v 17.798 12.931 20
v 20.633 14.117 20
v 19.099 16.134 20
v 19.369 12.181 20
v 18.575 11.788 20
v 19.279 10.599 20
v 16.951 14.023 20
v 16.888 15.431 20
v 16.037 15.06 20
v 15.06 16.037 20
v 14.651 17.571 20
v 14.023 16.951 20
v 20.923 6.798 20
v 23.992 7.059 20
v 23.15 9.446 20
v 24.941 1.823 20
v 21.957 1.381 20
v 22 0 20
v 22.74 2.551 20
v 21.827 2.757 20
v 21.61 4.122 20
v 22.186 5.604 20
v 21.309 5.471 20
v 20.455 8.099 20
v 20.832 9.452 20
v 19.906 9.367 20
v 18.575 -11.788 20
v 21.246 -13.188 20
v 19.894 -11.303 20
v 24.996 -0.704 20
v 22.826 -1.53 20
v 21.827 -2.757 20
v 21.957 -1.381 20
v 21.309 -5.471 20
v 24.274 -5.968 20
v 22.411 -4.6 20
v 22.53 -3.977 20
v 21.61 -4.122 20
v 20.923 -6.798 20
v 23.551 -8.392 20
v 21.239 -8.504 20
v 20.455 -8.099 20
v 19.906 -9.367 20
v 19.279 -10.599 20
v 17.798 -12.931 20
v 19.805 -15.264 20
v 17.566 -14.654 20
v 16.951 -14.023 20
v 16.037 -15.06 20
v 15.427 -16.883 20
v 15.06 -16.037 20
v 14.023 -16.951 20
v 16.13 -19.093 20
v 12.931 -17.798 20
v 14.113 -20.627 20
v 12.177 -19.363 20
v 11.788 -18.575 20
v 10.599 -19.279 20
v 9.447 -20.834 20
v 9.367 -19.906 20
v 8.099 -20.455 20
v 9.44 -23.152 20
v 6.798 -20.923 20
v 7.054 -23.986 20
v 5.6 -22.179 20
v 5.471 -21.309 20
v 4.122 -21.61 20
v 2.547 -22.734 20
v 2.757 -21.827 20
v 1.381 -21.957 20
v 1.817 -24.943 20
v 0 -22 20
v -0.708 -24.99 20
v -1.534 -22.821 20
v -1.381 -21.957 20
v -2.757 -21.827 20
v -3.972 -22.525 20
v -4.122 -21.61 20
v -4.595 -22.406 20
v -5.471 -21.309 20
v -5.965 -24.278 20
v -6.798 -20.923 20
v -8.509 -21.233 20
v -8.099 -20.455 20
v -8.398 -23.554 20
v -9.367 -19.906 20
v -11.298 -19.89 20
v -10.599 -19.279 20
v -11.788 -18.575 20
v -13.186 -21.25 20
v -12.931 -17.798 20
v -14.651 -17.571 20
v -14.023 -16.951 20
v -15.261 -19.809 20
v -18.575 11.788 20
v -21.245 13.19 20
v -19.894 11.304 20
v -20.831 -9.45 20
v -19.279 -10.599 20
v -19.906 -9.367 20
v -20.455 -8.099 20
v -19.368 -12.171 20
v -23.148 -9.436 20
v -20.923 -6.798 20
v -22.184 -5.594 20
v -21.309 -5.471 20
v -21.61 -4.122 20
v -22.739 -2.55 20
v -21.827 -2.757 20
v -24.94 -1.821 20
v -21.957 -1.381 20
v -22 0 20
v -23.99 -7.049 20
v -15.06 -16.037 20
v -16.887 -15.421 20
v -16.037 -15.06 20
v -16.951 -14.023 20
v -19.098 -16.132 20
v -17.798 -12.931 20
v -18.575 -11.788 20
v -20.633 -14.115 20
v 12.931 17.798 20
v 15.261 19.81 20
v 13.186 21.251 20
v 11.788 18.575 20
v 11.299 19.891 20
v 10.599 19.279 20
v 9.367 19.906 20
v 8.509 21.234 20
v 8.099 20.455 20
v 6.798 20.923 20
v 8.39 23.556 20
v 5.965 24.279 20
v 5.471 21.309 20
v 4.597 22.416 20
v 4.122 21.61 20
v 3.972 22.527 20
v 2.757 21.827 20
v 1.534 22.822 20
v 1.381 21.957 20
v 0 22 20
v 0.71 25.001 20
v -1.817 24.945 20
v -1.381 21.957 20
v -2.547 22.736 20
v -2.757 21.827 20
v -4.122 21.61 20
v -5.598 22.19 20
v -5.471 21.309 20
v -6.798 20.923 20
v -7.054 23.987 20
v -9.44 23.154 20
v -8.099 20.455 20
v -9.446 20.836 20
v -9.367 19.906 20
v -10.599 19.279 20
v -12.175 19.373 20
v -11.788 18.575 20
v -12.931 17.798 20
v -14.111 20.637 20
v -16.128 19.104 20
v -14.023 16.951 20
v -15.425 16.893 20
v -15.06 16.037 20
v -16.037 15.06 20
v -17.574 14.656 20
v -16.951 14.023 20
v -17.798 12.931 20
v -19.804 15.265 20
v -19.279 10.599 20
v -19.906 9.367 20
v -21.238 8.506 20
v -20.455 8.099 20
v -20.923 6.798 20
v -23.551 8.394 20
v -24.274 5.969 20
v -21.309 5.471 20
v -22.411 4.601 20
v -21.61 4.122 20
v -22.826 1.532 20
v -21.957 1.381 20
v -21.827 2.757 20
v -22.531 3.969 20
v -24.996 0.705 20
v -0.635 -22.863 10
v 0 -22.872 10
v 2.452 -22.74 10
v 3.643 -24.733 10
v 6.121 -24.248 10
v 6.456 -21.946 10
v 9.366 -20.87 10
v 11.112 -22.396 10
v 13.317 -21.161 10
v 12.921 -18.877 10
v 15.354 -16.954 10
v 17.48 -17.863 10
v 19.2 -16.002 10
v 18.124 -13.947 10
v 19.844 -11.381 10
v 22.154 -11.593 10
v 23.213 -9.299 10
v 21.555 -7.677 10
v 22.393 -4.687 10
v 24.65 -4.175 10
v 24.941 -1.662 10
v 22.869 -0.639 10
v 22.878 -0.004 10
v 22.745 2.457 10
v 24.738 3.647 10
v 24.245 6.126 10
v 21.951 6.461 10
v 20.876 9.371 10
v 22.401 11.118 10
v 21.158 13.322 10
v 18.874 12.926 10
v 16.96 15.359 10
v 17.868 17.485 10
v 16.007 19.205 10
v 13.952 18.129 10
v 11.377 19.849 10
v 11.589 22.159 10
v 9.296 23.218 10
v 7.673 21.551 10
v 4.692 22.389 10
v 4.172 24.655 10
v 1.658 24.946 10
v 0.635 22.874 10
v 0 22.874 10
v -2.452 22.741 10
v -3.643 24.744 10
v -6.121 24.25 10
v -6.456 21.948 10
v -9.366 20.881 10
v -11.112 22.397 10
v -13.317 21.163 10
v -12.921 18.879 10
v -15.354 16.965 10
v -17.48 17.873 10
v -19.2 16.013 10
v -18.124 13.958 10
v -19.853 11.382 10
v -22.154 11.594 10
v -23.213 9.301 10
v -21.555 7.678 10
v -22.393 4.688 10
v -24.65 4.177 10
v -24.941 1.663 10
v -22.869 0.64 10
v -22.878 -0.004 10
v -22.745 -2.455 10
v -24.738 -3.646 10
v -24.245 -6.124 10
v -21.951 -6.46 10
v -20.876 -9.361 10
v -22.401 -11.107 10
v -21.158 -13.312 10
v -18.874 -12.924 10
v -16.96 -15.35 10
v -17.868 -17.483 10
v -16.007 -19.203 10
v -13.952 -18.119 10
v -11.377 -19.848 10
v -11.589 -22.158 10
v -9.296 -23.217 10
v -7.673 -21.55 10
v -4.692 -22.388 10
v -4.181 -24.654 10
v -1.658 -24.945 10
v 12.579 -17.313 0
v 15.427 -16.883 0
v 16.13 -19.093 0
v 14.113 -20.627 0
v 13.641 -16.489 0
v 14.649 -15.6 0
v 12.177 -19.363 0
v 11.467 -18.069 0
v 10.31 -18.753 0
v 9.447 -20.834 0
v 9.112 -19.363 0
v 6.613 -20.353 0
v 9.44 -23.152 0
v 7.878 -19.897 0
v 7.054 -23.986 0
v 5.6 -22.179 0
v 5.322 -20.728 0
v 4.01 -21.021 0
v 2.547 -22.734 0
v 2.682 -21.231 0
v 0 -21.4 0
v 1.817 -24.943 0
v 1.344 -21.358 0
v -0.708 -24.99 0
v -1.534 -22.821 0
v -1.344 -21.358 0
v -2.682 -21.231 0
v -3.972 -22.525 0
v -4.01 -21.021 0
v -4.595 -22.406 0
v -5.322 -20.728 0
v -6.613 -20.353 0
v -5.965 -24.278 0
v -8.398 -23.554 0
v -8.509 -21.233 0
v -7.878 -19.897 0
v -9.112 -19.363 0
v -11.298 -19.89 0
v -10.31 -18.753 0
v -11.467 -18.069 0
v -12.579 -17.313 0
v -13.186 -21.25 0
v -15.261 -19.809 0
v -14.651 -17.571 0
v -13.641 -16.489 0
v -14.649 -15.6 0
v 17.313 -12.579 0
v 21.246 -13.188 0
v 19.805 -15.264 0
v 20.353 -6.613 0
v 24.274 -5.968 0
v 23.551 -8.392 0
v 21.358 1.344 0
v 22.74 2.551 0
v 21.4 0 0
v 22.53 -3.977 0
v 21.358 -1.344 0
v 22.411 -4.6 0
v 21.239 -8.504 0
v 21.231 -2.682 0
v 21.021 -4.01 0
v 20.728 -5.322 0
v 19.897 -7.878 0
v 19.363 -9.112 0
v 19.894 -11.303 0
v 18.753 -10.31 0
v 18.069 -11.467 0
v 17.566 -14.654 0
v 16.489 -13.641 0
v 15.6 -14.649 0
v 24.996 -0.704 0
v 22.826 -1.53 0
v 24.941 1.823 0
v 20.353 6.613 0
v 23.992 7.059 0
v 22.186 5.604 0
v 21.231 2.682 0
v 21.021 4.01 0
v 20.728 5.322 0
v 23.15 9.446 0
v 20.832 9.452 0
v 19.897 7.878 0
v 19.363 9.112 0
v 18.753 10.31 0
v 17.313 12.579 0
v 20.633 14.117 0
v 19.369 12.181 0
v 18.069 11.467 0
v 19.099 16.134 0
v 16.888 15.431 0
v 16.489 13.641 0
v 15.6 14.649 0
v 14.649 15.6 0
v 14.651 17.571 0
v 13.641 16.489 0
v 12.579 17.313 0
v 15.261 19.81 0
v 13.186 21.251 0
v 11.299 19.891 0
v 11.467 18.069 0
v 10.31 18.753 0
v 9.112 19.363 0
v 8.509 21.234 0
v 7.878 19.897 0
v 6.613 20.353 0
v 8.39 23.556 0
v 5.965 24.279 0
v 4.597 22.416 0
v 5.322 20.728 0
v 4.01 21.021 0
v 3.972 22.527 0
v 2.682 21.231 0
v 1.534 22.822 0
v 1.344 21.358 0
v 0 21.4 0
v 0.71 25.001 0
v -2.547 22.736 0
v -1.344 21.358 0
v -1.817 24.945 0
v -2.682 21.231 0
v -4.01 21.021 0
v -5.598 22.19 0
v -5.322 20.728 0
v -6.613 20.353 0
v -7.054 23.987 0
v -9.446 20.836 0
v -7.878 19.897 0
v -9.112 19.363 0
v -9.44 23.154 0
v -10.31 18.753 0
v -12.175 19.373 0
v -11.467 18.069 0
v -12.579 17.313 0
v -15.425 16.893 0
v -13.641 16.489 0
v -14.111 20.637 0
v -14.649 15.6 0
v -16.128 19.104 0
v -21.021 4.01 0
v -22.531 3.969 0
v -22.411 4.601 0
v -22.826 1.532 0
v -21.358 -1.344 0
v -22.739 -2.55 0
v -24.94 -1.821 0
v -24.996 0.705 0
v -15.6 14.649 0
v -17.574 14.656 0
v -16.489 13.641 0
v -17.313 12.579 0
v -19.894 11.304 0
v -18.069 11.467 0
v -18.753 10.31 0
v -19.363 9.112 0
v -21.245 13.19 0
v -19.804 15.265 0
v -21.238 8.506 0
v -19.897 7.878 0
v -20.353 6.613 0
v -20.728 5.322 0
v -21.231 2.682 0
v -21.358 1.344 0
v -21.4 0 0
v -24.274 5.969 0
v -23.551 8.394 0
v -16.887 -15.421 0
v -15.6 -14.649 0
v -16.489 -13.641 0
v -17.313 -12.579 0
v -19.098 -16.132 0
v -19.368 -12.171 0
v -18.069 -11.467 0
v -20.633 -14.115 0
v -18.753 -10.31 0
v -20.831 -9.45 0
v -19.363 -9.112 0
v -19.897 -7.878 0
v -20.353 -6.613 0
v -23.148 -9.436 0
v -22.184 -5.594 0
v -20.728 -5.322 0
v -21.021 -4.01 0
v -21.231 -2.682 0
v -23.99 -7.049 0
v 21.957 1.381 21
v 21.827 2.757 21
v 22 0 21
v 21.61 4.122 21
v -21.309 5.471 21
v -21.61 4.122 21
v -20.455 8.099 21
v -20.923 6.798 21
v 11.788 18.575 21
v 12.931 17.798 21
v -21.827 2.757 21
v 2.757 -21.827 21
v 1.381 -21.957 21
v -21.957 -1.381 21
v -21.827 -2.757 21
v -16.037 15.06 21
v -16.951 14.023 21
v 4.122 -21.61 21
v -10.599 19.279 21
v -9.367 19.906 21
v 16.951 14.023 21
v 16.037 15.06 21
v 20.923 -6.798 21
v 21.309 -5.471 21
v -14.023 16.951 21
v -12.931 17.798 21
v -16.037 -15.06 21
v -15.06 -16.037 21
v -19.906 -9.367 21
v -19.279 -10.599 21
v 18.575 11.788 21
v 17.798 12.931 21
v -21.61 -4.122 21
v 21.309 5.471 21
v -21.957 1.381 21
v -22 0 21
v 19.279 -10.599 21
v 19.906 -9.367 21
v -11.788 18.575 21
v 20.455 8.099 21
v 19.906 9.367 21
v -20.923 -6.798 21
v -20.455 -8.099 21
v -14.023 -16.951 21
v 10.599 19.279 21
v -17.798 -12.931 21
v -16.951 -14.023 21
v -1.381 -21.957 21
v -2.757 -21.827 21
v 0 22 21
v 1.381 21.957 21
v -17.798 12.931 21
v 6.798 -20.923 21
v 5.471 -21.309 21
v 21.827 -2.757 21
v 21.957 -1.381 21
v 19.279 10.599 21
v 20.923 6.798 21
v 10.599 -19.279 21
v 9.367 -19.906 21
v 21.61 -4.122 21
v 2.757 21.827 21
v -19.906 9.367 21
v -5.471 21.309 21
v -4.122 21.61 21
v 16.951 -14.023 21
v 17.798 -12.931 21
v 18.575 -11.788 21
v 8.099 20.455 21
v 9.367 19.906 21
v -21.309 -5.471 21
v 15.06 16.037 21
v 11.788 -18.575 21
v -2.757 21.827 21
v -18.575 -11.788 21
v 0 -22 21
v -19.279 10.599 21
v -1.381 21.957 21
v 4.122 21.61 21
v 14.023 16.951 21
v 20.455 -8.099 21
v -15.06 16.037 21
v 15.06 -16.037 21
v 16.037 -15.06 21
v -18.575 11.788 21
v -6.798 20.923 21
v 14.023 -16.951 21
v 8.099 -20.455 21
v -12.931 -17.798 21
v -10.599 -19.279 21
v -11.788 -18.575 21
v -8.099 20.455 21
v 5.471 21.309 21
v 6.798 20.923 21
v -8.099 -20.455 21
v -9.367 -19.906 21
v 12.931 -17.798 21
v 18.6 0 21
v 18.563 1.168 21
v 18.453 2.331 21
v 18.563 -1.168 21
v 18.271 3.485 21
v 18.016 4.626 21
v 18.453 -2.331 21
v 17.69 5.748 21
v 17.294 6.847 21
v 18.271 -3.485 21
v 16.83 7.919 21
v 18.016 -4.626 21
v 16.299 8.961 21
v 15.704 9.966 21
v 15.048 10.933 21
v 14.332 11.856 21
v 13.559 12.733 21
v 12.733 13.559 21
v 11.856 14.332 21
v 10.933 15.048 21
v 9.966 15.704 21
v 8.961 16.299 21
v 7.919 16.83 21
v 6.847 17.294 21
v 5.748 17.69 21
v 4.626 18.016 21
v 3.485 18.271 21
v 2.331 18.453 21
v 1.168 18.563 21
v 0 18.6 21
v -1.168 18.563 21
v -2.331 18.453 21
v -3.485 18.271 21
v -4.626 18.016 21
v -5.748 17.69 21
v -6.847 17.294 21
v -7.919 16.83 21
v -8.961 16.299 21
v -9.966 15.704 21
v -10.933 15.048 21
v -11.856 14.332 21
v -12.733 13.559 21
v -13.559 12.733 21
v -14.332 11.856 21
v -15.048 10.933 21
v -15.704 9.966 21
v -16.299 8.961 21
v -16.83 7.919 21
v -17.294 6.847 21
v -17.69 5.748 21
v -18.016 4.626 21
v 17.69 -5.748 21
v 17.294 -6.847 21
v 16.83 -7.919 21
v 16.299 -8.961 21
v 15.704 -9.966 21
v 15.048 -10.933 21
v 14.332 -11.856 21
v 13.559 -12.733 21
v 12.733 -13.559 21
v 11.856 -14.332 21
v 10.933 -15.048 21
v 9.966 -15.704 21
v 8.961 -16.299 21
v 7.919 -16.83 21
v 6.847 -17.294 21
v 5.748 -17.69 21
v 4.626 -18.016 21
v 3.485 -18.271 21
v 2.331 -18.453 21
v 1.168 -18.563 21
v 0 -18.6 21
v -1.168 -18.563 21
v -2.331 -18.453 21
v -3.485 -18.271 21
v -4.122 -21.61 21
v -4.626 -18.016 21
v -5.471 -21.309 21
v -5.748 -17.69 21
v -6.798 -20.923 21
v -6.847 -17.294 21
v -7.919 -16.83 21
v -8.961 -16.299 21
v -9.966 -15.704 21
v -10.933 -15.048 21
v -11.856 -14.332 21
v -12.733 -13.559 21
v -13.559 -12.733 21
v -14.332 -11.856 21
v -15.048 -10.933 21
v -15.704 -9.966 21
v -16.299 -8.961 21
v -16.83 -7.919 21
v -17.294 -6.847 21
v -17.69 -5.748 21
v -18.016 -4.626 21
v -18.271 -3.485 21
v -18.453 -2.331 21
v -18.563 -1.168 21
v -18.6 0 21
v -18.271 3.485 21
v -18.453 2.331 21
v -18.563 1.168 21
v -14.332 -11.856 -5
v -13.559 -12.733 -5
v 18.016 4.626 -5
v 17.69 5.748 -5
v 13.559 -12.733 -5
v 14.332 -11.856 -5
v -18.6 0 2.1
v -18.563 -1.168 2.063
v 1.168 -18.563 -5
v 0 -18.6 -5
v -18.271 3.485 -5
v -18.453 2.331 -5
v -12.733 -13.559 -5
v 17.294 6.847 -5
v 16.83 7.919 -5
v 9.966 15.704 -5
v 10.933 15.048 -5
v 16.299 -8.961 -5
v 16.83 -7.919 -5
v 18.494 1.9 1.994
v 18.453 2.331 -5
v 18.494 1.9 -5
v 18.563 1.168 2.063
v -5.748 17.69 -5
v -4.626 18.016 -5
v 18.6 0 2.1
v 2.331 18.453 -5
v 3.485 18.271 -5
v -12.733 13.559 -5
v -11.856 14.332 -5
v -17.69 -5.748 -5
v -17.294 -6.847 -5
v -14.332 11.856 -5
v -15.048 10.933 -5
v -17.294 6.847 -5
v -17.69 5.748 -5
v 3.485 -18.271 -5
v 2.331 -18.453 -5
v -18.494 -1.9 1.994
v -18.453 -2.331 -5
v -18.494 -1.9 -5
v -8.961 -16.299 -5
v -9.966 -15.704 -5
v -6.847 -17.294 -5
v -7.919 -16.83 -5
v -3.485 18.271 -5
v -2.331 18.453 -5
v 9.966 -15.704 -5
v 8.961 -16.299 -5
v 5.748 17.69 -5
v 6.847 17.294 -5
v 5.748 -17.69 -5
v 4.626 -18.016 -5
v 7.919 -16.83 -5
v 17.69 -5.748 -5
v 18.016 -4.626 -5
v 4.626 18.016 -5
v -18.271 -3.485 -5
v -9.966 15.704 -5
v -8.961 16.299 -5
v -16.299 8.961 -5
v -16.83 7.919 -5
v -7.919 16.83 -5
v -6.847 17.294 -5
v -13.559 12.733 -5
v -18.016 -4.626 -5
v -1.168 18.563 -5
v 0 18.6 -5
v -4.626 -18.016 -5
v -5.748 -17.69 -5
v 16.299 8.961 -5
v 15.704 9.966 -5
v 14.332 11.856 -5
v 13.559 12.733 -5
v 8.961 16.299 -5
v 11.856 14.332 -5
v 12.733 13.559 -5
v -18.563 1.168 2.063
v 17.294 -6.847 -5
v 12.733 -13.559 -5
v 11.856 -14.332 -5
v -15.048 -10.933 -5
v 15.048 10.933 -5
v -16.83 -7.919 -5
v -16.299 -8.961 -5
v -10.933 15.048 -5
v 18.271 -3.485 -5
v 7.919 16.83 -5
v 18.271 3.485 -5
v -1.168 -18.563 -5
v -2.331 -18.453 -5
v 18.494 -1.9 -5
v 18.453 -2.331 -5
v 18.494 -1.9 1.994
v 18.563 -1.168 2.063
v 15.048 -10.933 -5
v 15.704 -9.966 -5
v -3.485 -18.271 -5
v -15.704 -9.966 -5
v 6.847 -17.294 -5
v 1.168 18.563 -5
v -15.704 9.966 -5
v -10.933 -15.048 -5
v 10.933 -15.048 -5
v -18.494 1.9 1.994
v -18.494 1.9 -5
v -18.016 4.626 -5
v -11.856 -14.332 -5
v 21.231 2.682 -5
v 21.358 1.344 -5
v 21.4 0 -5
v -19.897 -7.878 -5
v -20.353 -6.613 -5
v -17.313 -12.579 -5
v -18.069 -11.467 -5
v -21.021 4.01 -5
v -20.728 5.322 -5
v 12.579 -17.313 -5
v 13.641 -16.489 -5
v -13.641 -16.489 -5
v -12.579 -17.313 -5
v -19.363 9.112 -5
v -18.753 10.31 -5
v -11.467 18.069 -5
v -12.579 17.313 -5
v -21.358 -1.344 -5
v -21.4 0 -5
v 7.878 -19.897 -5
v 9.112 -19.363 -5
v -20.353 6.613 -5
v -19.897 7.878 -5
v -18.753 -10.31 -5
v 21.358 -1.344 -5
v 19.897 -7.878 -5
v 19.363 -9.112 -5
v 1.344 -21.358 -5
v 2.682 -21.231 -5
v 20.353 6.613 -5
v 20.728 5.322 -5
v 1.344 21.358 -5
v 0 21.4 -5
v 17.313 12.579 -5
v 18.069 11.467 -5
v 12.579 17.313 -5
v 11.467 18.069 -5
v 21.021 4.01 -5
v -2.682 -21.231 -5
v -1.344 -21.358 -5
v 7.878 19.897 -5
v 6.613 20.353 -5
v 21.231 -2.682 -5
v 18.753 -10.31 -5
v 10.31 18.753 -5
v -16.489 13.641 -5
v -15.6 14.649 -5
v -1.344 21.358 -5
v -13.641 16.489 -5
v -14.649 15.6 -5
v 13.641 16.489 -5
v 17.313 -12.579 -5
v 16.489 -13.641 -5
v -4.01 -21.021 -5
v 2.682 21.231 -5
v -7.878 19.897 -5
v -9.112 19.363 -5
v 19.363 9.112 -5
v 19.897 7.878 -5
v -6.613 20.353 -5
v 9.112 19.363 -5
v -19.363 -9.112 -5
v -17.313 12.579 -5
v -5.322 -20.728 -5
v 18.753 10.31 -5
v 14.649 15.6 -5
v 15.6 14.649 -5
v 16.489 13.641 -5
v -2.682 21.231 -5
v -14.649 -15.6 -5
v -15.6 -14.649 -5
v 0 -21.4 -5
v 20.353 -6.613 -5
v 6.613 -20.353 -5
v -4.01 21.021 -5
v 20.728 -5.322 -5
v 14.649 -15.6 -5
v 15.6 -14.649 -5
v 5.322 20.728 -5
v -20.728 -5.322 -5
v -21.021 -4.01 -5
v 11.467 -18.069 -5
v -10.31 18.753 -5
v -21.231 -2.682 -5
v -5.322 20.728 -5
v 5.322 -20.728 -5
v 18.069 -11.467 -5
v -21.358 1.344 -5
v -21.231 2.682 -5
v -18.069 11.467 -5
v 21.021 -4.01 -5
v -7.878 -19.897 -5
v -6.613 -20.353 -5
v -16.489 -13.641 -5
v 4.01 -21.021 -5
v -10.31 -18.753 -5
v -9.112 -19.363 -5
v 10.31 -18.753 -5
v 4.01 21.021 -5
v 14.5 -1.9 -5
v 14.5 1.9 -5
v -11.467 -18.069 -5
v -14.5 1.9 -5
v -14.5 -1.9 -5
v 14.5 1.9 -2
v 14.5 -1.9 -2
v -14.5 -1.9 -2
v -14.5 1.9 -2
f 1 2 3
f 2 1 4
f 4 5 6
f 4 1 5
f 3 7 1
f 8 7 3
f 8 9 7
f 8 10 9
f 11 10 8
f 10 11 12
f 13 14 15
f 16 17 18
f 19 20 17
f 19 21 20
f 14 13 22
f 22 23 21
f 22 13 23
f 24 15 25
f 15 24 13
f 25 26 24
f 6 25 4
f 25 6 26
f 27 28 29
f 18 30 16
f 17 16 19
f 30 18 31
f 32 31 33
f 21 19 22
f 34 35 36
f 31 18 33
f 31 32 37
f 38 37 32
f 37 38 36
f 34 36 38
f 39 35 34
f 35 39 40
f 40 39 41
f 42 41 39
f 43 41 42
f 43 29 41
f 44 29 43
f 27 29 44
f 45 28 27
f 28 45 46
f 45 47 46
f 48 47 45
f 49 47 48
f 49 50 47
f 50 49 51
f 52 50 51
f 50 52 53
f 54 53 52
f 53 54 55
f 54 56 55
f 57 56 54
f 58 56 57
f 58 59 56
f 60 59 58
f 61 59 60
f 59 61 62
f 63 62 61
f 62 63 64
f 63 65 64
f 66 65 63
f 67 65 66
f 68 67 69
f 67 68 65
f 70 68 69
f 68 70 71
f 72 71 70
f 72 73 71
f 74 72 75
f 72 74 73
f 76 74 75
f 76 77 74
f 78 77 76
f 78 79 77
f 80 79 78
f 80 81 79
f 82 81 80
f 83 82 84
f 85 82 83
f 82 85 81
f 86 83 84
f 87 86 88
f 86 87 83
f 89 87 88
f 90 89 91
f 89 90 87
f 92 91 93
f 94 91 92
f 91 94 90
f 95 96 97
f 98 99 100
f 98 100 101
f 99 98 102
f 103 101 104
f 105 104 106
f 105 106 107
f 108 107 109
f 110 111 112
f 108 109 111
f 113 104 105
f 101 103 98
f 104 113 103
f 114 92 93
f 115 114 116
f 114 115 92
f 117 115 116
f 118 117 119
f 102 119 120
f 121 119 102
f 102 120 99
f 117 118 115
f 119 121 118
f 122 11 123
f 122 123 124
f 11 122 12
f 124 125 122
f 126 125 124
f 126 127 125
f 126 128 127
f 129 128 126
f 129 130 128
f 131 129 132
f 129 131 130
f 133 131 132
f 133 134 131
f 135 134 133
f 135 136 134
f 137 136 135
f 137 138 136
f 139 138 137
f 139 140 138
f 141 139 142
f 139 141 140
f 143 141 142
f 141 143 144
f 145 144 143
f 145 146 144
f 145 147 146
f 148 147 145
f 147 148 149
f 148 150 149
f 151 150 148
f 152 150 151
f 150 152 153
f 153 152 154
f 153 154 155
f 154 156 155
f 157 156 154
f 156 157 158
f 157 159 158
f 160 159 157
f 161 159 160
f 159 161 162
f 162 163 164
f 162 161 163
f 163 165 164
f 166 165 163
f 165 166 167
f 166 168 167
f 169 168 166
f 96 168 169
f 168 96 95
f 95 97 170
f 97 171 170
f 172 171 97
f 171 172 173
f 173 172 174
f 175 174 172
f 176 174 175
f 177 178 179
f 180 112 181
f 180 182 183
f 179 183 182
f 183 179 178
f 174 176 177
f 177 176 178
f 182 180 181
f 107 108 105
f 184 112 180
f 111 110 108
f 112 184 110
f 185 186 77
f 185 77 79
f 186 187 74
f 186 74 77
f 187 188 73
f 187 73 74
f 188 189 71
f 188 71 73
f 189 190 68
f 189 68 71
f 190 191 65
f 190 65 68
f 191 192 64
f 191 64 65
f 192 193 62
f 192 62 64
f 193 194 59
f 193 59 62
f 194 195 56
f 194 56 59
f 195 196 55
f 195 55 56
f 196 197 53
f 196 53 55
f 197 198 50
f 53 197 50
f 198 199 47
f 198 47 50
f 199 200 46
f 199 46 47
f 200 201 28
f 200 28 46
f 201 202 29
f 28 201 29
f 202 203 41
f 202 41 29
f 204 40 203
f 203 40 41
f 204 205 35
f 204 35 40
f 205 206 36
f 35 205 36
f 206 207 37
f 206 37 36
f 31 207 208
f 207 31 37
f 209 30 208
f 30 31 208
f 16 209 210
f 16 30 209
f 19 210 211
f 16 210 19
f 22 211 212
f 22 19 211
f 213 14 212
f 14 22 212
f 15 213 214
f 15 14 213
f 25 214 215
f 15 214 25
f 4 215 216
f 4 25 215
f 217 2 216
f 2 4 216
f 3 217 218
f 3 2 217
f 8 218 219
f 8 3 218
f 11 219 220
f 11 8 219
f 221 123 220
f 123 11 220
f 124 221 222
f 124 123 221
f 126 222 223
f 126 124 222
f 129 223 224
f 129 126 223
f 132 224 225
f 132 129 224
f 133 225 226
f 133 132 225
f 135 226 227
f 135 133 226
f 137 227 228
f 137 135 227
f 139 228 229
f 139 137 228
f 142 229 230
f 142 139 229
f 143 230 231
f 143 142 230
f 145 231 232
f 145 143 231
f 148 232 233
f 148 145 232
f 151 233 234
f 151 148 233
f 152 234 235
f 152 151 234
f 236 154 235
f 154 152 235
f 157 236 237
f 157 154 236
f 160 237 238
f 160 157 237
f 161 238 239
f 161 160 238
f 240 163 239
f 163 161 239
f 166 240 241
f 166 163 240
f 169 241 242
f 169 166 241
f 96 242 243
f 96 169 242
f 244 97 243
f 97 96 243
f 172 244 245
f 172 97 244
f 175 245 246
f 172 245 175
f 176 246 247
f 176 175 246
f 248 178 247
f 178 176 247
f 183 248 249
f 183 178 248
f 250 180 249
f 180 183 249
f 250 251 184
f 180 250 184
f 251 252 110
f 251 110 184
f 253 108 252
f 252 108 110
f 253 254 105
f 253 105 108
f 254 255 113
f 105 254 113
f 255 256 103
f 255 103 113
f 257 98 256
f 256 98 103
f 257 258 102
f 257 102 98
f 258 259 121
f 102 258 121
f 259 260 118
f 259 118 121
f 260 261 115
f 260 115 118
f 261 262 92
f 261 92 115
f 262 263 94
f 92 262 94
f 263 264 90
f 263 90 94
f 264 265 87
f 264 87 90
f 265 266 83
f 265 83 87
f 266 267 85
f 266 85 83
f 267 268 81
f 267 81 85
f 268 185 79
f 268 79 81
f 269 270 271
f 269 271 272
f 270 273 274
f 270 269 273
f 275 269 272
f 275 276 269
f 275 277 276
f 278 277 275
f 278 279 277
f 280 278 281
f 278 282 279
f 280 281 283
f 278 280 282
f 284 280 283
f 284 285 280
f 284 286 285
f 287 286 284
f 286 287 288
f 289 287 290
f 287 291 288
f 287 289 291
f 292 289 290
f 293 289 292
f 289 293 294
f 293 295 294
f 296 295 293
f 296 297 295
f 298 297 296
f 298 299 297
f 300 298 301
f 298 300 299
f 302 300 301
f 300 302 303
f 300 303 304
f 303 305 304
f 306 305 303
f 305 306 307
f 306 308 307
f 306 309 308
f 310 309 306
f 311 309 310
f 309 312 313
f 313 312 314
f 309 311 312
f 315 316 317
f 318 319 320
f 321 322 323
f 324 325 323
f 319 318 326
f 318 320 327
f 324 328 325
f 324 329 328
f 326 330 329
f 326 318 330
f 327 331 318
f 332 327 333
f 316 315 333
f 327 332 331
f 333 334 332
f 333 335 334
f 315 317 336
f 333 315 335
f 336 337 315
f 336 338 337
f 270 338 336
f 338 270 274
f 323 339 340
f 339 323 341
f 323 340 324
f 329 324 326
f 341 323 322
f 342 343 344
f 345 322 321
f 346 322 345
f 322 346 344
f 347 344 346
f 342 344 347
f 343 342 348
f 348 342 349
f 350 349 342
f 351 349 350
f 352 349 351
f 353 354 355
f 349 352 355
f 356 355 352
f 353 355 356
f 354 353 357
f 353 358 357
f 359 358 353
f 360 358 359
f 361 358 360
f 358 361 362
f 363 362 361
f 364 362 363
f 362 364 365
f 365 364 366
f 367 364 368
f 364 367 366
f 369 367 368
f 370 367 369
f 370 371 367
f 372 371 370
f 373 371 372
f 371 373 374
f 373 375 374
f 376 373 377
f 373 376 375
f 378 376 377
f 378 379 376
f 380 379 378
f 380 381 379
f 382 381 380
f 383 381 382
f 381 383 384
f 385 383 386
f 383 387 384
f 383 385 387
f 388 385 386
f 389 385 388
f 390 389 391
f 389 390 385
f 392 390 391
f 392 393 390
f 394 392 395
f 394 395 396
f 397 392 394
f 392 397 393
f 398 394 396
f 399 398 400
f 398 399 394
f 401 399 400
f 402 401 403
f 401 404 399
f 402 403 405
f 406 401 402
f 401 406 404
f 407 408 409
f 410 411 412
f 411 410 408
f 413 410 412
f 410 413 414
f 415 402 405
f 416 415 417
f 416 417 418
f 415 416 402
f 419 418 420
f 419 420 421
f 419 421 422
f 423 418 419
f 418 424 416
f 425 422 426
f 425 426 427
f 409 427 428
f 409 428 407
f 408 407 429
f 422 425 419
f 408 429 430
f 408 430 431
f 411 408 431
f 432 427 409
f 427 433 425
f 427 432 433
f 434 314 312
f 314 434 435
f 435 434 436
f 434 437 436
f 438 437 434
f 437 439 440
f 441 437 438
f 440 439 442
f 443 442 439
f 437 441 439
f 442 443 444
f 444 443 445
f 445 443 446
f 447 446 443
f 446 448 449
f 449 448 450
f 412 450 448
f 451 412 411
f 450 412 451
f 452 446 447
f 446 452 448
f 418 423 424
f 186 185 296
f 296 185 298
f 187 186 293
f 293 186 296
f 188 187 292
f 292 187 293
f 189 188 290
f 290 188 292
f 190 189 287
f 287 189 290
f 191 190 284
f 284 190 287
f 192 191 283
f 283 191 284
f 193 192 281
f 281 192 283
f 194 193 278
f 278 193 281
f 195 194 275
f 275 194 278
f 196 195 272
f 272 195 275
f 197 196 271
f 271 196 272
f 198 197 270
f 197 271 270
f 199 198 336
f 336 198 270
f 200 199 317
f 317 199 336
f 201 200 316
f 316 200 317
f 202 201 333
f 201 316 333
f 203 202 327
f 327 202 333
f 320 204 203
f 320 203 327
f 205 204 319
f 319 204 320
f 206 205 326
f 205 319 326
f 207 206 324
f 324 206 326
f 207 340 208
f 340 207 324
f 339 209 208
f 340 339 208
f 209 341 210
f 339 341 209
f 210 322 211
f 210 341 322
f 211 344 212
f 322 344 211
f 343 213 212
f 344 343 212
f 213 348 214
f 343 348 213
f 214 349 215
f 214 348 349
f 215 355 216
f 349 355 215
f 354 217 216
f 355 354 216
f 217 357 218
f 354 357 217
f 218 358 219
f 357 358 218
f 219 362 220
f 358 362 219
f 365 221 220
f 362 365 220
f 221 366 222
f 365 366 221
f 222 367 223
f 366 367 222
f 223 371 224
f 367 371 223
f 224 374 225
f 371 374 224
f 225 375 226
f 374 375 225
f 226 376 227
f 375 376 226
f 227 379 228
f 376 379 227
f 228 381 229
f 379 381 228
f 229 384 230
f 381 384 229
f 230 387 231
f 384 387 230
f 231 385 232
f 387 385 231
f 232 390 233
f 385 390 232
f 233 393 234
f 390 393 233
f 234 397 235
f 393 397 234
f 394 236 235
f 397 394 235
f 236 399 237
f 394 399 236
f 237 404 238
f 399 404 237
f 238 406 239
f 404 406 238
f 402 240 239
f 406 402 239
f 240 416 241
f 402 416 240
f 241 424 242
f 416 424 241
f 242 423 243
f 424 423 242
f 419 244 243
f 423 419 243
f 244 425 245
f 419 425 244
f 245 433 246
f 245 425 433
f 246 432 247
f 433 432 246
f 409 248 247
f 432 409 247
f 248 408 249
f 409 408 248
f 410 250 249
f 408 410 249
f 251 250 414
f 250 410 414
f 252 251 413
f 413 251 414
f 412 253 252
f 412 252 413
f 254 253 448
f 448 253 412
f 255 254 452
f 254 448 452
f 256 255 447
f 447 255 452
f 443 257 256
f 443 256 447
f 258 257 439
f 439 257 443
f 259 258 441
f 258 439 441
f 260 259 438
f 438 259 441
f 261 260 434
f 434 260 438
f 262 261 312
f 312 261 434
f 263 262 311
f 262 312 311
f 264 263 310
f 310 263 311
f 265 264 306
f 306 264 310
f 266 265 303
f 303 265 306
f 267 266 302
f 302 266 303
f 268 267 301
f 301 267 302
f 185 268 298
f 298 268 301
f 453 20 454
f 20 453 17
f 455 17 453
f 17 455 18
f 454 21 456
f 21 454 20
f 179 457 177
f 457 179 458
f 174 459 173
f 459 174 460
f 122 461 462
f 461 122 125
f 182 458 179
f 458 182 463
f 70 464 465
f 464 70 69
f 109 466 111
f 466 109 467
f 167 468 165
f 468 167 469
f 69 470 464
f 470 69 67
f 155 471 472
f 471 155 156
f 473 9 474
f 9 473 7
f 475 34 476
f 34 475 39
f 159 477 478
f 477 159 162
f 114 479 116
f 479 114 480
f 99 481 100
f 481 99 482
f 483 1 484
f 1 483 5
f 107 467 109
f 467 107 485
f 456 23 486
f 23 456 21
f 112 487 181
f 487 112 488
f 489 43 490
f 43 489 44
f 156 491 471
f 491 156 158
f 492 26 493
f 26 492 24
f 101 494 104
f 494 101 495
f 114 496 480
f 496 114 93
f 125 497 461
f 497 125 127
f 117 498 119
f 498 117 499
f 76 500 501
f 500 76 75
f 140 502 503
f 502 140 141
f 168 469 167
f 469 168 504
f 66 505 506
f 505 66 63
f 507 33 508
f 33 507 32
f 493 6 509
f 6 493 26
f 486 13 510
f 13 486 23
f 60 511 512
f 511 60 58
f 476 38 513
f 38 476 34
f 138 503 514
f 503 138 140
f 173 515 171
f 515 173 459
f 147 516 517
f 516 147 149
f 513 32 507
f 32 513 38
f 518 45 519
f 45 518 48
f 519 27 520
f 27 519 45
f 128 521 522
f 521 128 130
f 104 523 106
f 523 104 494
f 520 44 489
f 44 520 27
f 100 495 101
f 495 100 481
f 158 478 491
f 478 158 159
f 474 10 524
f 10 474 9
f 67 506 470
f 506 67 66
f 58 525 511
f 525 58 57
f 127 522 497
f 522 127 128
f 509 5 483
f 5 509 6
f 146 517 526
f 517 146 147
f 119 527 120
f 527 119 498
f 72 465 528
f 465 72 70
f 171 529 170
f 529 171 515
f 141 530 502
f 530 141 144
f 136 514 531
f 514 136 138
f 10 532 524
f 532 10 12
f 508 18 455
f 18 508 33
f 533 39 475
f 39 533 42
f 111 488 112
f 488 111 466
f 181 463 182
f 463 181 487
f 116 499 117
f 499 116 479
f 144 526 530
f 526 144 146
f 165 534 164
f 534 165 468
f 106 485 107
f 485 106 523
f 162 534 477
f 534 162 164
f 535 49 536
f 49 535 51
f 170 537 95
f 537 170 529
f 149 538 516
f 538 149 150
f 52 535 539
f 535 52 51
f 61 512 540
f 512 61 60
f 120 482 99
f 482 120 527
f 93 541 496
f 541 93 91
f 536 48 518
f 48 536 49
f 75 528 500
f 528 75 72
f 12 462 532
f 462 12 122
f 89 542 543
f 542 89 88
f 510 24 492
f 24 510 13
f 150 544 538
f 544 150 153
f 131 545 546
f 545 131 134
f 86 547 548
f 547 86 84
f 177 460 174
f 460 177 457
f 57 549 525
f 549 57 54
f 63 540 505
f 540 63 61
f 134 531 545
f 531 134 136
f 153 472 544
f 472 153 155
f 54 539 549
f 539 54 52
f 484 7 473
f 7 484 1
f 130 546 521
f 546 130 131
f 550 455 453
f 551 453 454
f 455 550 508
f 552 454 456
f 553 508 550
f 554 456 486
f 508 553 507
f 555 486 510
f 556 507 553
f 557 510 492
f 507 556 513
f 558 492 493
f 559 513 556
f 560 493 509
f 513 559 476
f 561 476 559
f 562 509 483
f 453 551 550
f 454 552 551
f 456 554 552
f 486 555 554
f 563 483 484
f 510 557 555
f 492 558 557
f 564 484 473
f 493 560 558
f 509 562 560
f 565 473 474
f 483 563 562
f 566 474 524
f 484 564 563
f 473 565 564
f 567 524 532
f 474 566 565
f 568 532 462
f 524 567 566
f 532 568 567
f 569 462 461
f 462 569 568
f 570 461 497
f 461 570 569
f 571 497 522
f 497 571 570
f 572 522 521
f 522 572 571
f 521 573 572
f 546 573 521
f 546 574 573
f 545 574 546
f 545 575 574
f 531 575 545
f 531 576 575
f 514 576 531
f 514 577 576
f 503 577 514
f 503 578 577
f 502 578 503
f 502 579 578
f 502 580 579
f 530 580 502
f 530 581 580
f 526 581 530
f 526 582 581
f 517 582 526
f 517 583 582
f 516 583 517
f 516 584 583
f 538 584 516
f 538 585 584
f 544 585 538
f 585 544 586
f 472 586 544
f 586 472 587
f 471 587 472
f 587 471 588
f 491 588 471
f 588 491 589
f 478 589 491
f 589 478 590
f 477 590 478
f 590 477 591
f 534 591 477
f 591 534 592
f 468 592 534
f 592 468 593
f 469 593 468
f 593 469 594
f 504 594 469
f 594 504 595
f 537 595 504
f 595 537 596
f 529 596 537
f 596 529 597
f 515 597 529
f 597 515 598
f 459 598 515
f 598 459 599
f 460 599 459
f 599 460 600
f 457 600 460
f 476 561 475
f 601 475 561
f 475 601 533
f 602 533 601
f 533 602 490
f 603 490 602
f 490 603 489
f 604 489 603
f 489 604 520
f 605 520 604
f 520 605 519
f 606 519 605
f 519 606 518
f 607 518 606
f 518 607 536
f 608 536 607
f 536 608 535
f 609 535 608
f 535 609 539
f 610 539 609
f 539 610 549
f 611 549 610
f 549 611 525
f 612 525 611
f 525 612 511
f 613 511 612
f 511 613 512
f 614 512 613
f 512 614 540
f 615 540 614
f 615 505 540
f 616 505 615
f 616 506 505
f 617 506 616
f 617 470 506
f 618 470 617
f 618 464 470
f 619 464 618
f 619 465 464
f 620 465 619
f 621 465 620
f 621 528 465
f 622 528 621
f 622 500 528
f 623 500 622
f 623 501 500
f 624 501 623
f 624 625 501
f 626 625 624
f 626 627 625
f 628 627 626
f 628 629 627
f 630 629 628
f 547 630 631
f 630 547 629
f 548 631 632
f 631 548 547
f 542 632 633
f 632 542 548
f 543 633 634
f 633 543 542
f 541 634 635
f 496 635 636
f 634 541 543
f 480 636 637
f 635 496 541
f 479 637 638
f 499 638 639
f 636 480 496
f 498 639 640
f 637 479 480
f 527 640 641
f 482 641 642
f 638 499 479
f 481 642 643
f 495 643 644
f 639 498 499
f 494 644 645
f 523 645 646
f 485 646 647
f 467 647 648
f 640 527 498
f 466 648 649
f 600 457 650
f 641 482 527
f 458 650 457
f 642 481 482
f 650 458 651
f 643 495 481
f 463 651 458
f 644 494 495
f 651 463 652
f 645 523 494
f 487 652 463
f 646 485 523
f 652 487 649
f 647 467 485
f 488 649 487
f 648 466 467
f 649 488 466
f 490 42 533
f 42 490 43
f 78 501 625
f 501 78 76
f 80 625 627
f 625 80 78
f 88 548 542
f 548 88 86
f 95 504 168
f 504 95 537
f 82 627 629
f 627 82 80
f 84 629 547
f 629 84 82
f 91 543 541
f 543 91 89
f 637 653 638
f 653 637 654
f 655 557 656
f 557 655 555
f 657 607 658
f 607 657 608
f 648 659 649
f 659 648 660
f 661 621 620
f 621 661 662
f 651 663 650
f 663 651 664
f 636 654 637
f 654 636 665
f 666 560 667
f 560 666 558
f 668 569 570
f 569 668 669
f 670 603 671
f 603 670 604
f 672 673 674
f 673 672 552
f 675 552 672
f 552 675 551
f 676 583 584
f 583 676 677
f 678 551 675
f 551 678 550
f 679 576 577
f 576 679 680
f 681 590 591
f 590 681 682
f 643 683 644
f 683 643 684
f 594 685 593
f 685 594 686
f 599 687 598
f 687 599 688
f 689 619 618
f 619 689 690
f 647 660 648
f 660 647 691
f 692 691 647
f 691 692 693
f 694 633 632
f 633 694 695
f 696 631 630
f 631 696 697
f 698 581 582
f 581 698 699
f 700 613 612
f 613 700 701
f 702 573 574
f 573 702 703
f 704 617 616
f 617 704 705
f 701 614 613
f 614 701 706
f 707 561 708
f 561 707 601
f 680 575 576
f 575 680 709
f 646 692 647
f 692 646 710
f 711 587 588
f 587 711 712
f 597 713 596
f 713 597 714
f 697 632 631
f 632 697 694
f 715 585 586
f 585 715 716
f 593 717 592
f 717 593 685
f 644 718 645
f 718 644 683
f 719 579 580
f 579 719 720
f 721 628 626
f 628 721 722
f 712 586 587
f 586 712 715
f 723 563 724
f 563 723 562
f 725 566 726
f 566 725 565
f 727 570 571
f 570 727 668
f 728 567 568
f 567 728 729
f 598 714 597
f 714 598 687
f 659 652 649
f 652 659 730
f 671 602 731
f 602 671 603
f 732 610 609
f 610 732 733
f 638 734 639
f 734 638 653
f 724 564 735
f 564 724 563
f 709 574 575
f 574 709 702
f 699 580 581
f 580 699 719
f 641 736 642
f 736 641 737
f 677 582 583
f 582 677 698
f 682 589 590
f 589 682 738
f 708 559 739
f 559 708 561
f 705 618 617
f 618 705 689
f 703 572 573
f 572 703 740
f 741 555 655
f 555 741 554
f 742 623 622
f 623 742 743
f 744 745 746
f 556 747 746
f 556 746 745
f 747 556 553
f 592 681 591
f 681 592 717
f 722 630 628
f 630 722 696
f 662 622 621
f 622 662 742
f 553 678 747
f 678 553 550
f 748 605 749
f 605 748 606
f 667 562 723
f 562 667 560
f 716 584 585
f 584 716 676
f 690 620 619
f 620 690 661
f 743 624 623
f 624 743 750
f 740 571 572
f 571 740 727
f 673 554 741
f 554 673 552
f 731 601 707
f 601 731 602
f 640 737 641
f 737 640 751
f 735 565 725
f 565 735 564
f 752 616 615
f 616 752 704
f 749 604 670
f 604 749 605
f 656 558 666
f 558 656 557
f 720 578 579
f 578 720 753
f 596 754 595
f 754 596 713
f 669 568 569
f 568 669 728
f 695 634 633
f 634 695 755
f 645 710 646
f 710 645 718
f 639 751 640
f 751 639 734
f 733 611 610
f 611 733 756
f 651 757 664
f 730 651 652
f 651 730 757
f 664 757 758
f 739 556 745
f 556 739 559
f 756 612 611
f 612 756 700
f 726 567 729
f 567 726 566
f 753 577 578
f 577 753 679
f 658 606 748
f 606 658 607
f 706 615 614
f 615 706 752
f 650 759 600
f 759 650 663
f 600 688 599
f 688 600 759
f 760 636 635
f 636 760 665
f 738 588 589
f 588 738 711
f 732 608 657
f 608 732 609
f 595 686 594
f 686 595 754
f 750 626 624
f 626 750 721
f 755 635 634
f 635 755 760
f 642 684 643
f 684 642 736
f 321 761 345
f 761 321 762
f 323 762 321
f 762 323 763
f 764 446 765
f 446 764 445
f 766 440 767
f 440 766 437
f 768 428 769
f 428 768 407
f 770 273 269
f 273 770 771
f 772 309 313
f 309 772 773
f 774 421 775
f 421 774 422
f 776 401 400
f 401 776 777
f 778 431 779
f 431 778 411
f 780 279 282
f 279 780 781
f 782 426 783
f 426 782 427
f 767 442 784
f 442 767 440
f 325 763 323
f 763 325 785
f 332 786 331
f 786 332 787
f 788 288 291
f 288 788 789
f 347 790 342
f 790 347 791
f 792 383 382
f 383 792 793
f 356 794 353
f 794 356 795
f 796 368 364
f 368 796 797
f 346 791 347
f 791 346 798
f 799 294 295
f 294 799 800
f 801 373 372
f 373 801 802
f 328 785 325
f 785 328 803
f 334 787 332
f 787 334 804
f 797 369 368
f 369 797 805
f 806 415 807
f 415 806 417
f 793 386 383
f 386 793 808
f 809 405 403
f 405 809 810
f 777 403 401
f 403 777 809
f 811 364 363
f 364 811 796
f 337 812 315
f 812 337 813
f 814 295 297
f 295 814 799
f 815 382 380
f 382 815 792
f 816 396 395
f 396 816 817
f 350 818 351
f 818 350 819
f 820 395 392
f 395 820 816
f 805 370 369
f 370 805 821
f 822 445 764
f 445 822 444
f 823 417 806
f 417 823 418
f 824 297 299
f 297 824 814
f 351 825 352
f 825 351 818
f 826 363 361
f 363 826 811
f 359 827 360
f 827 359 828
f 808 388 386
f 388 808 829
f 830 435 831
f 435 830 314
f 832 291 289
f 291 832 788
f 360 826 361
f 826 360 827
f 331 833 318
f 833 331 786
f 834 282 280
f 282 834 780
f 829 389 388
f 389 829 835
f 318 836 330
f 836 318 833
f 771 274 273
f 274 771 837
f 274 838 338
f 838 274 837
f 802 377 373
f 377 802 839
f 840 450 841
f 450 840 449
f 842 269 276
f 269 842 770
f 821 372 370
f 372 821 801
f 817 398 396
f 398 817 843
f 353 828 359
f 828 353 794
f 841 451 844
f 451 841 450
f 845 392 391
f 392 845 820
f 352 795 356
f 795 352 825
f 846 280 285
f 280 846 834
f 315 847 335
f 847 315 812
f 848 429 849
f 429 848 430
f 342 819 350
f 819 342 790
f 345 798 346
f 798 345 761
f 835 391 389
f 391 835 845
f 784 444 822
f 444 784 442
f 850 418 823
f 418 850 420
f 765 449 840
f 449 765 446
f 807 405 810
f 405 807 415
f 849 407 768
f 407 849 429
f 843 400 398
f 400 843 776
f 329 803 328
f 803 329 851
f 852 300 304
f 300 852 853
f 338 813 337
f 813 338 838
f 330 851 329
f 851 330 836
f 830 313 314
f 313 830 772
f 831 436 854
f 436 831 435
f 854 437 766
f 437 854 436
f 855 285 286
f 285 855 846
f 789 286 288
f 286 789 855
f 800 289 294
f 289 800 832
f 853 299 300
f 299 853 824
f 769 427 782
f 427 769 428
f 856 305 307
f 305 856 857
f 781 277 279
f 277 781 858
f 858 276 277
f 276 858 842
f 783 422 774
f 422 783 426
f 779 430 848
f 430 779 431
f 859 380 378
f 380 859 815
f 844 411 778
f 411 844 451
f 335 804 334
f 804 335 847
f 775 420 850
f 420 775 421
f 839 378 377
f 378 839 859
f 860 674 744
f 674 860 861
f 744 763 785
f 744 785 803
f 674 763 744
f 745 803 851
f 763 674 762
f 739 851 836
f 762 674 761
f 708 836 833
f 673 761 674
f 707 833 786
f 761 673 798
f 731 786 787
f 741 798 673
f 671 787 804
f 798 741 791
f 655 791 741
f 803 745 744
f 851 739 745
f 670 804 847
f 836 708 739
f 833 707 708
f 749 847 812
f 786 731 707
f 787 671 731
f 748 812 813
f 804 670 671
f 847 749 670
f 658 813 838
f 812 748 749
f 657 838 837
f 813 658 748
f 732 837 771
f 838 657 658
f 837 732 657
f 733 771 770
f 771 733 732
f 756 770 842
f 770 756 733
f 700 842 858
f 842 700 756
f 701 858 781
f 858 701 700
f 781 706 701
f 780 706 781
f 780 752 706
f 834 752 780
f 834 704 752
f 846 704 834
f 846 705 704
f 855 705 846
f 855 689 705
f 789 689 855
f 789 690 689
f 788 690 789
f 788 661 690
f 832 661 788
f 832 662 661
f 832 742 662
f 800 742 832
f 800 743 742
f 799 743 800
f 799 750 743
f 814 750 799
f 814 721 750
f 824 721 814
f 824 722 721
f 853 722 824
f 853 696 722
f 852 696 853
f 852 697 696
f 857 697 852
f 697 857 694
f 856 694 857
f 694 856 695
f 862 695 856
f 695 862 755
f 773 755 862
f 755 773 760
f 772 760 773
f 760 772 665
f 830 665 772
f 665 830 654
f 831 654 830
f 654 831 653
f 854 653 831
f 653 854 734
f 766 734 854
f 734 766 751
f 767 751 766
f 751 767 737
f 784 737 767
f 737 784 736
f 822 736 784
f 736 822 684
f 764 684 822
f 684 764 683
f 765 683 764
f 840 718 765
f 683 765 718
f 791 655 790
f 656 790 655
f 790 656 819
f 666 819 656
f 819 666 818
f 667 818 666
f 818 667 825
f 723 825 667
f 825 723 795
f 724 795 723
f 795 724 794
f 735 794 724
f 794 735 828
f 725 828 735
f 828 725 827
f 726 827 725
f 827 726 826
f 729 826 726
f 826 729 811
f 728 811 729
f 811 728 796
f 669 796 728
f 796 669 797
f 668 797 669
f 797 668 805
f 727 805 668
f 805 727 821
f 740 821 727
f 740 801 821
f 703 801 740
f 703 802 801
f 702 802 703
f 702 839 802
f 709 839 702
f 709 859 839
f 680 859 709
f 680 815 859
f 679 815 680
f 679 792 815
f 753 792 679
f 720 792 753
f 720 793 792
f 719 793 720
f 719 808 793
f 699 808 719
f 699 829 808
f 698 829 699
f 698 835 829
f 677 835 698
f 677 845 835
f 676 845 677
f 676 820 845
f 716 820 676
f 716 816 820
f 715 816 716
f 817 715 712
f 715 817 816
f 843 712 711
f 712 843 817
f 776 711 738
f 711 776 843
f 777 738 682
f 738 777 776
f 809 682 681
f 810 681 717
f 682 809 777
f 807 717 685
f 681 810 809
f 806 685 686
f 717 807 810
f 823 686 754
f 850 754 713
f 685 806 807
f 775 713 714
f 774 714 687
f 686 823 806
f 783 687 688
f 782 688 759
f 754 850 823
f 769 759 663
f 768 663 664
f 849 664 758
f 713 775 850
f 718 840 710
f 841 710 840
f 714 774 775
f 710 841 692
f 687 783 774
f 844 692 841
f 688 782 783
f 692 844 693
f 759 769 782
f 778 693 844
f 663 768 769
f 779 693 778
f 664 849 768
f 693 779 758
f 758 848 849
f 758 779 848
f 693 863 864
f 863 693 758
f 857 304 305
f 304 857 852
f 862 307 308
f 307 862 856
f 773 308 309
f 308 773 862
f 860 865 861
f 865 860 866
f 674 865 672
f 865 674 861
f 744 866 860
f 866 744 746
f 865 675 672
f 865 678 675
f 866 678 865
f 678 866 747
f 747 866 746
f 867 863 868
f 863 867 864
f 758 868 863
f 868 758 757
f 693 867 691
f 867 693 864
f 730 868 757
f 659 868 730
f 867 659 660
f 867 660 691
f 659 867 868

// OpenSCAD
// Для того, чтобы распечатанные на 3д-принтере детали формы
// стыковались, желательно использовать значение print_error > 0,
// это позволит учесть погрешность размеров при печати 
// (для разных принтеров и пластиков значение может отличаться)

//print_error = 0;
print_error = 0.1;

// внутренняя поверхность формы
inner_surface(hoop_width=3, print_error=print_error);

// внешние скорлупки
//outer_box_half1(hoop_width=3, print_error=print_error);
//outer_box_half2(hoop_width=3, print_error=print_error);


/**
 * Внутренняя поверхность покрышки, должна совпадать 
 * с рельефом колеса.
 * @param hoop_width - ширина обода, выступающего вниз для
 * для фиксации на площадке внешней части формы.
 */
module inner_surface(hoop_width=3, print_error=0) {
  fixator_width=4;
    
  difference() {
    union() {
      // рельеф колеса
      translate([0, 0, 10]) {
        linear_extrude(height=10, twist=10) 
            import(file = "покрышка-внутр.dxf");
        mirror([0, 0, -1]) 
          linear_extrude(height=10, twist=10) 
            import(file = "покрышка-внутр.dxf");
      }
      // выступаящая вверх стенка, чтобы не разливался силикон
      cylinder(h=21, r=22, $fn=100);
    }


    // вычтем изнутри цилиндр для экономии пластика
    translate([0, 0, -1])
      cylinder(h=25, r=18.6, $fn=100);
  }

  // выступающий вниз обод для фиксации на площадке
  difference() {
    translate([0, 0, -5])
      cylinder(h=10, r=20+hoop_width/2-print_error, $fn=100);

    translate([0, 0, -6])
      cylinder(h=12, r=20-hoop_width/2+print_error, $fn=100);
  }

  // фиксторы вращения
  translate([14.5, -fixator_width/2+print_error, -5]) difference() {
    cube([6, fixator_width-print_error*2, 8]);
    // небольшой скос сверху
    translate([0, -0.1, 3]) rotate([0, -45, 0]) cube([8, fixator_width+0.2, 4]);
  }
  mirror([1, 0, 0]) translate([14.5, -fixator_width/2+print_error, -5]) difference() {
    cube([6, fixator_width-print_error*2, 8]);
    // небольшой скос сверху
    translate([0, -0.1, 3]) rotate([0, -45, 0]) cube([8, fixator_width+0.2, 4]);
  }
}

/**
 * Первая половина внешней коробки.
 * @param hoop_width - ширина обода, выступающего вниз для
 * для фиксации на площадке внешней части формы.
 */
module outer_box_half1(hoop_width=3, print_error=0) {
  difference() {
    outer_box(hoop_width=hoop_width, print_error=print_error);

    translate([0, -34, -8])
        cube([34, 68, 32]);
  }
}

/**
 * Вторая половина внешней коробки.
 * @param hoop_width - ширина обода, выступающего вниз для
 * для фиксации на площадке внешней части формы.
 */
module outer_box_half2(hoop_width=3, print_error=0) {
  difference() {
    outer_box(hoop_width=hoop_width, print_error=print_error);

    translate([-34, -34, -8])
        cube([34, 68, 32]);
  }
}

/**
 * Внешняя коробка с рельефом протектора.
 * @param hoop_width - ширина обода, выступающего вниз для
 * для фиксации на площадке внешней части формы.
 */
module outer_box(hoop_width=3, print_error=0) {
  fixator_width=4;
    
  difference() {
    // матрица для рисунка протектора
    translate([0, 0, -7])
      cylinder(h=28, r=33, $fn=100);
    
    // рельефный протектор
    tyre_pattern();

    // стенка наверху, чтобы не разливался силикон
    translate([0, 0, 20])
      cylinder(h=5, r=31, $fn=100);

    // паз для выступающего вниз обода
    difference() {
      translate([0, 0, -5.5])
        cylinder(h=10, r=20+hoop_width/2+print_error, $fn=100);

      translate([0, 0, -6])
        cylinder(h=12, r=20-hoop_width/2-print_error, $fn=100);
    }
      
    // пазы для фиксаторов
    translate([14, -fixator_width/2-print_error, -5.5]) 
      cube([6, fixator_width+print_error*2, 6]);
    translate([-20, -fixator_width/2-print_error, -5.5]) 
      cube([6, fixator_width+print_error*2, 6]);

    // внутренняя дырка для экономии пластика
    translate([0, 0, -10])
      cylinder(h=20, r=13, $fn=100);
  }
}

/** Рисунок проектора */
module tyre_pattern() {
  // рельефный протектор
  translate([0, 0, 10]) {
    linear_extrude(height=10, twist=10) 
        import(file = "покрышка-внешн.dxf");
    mirror([0, 0, -1]) 
      linear_extrude(height=10, twist=10) 
        import(file = "покрышка-внешн.dxf");
  }
}
